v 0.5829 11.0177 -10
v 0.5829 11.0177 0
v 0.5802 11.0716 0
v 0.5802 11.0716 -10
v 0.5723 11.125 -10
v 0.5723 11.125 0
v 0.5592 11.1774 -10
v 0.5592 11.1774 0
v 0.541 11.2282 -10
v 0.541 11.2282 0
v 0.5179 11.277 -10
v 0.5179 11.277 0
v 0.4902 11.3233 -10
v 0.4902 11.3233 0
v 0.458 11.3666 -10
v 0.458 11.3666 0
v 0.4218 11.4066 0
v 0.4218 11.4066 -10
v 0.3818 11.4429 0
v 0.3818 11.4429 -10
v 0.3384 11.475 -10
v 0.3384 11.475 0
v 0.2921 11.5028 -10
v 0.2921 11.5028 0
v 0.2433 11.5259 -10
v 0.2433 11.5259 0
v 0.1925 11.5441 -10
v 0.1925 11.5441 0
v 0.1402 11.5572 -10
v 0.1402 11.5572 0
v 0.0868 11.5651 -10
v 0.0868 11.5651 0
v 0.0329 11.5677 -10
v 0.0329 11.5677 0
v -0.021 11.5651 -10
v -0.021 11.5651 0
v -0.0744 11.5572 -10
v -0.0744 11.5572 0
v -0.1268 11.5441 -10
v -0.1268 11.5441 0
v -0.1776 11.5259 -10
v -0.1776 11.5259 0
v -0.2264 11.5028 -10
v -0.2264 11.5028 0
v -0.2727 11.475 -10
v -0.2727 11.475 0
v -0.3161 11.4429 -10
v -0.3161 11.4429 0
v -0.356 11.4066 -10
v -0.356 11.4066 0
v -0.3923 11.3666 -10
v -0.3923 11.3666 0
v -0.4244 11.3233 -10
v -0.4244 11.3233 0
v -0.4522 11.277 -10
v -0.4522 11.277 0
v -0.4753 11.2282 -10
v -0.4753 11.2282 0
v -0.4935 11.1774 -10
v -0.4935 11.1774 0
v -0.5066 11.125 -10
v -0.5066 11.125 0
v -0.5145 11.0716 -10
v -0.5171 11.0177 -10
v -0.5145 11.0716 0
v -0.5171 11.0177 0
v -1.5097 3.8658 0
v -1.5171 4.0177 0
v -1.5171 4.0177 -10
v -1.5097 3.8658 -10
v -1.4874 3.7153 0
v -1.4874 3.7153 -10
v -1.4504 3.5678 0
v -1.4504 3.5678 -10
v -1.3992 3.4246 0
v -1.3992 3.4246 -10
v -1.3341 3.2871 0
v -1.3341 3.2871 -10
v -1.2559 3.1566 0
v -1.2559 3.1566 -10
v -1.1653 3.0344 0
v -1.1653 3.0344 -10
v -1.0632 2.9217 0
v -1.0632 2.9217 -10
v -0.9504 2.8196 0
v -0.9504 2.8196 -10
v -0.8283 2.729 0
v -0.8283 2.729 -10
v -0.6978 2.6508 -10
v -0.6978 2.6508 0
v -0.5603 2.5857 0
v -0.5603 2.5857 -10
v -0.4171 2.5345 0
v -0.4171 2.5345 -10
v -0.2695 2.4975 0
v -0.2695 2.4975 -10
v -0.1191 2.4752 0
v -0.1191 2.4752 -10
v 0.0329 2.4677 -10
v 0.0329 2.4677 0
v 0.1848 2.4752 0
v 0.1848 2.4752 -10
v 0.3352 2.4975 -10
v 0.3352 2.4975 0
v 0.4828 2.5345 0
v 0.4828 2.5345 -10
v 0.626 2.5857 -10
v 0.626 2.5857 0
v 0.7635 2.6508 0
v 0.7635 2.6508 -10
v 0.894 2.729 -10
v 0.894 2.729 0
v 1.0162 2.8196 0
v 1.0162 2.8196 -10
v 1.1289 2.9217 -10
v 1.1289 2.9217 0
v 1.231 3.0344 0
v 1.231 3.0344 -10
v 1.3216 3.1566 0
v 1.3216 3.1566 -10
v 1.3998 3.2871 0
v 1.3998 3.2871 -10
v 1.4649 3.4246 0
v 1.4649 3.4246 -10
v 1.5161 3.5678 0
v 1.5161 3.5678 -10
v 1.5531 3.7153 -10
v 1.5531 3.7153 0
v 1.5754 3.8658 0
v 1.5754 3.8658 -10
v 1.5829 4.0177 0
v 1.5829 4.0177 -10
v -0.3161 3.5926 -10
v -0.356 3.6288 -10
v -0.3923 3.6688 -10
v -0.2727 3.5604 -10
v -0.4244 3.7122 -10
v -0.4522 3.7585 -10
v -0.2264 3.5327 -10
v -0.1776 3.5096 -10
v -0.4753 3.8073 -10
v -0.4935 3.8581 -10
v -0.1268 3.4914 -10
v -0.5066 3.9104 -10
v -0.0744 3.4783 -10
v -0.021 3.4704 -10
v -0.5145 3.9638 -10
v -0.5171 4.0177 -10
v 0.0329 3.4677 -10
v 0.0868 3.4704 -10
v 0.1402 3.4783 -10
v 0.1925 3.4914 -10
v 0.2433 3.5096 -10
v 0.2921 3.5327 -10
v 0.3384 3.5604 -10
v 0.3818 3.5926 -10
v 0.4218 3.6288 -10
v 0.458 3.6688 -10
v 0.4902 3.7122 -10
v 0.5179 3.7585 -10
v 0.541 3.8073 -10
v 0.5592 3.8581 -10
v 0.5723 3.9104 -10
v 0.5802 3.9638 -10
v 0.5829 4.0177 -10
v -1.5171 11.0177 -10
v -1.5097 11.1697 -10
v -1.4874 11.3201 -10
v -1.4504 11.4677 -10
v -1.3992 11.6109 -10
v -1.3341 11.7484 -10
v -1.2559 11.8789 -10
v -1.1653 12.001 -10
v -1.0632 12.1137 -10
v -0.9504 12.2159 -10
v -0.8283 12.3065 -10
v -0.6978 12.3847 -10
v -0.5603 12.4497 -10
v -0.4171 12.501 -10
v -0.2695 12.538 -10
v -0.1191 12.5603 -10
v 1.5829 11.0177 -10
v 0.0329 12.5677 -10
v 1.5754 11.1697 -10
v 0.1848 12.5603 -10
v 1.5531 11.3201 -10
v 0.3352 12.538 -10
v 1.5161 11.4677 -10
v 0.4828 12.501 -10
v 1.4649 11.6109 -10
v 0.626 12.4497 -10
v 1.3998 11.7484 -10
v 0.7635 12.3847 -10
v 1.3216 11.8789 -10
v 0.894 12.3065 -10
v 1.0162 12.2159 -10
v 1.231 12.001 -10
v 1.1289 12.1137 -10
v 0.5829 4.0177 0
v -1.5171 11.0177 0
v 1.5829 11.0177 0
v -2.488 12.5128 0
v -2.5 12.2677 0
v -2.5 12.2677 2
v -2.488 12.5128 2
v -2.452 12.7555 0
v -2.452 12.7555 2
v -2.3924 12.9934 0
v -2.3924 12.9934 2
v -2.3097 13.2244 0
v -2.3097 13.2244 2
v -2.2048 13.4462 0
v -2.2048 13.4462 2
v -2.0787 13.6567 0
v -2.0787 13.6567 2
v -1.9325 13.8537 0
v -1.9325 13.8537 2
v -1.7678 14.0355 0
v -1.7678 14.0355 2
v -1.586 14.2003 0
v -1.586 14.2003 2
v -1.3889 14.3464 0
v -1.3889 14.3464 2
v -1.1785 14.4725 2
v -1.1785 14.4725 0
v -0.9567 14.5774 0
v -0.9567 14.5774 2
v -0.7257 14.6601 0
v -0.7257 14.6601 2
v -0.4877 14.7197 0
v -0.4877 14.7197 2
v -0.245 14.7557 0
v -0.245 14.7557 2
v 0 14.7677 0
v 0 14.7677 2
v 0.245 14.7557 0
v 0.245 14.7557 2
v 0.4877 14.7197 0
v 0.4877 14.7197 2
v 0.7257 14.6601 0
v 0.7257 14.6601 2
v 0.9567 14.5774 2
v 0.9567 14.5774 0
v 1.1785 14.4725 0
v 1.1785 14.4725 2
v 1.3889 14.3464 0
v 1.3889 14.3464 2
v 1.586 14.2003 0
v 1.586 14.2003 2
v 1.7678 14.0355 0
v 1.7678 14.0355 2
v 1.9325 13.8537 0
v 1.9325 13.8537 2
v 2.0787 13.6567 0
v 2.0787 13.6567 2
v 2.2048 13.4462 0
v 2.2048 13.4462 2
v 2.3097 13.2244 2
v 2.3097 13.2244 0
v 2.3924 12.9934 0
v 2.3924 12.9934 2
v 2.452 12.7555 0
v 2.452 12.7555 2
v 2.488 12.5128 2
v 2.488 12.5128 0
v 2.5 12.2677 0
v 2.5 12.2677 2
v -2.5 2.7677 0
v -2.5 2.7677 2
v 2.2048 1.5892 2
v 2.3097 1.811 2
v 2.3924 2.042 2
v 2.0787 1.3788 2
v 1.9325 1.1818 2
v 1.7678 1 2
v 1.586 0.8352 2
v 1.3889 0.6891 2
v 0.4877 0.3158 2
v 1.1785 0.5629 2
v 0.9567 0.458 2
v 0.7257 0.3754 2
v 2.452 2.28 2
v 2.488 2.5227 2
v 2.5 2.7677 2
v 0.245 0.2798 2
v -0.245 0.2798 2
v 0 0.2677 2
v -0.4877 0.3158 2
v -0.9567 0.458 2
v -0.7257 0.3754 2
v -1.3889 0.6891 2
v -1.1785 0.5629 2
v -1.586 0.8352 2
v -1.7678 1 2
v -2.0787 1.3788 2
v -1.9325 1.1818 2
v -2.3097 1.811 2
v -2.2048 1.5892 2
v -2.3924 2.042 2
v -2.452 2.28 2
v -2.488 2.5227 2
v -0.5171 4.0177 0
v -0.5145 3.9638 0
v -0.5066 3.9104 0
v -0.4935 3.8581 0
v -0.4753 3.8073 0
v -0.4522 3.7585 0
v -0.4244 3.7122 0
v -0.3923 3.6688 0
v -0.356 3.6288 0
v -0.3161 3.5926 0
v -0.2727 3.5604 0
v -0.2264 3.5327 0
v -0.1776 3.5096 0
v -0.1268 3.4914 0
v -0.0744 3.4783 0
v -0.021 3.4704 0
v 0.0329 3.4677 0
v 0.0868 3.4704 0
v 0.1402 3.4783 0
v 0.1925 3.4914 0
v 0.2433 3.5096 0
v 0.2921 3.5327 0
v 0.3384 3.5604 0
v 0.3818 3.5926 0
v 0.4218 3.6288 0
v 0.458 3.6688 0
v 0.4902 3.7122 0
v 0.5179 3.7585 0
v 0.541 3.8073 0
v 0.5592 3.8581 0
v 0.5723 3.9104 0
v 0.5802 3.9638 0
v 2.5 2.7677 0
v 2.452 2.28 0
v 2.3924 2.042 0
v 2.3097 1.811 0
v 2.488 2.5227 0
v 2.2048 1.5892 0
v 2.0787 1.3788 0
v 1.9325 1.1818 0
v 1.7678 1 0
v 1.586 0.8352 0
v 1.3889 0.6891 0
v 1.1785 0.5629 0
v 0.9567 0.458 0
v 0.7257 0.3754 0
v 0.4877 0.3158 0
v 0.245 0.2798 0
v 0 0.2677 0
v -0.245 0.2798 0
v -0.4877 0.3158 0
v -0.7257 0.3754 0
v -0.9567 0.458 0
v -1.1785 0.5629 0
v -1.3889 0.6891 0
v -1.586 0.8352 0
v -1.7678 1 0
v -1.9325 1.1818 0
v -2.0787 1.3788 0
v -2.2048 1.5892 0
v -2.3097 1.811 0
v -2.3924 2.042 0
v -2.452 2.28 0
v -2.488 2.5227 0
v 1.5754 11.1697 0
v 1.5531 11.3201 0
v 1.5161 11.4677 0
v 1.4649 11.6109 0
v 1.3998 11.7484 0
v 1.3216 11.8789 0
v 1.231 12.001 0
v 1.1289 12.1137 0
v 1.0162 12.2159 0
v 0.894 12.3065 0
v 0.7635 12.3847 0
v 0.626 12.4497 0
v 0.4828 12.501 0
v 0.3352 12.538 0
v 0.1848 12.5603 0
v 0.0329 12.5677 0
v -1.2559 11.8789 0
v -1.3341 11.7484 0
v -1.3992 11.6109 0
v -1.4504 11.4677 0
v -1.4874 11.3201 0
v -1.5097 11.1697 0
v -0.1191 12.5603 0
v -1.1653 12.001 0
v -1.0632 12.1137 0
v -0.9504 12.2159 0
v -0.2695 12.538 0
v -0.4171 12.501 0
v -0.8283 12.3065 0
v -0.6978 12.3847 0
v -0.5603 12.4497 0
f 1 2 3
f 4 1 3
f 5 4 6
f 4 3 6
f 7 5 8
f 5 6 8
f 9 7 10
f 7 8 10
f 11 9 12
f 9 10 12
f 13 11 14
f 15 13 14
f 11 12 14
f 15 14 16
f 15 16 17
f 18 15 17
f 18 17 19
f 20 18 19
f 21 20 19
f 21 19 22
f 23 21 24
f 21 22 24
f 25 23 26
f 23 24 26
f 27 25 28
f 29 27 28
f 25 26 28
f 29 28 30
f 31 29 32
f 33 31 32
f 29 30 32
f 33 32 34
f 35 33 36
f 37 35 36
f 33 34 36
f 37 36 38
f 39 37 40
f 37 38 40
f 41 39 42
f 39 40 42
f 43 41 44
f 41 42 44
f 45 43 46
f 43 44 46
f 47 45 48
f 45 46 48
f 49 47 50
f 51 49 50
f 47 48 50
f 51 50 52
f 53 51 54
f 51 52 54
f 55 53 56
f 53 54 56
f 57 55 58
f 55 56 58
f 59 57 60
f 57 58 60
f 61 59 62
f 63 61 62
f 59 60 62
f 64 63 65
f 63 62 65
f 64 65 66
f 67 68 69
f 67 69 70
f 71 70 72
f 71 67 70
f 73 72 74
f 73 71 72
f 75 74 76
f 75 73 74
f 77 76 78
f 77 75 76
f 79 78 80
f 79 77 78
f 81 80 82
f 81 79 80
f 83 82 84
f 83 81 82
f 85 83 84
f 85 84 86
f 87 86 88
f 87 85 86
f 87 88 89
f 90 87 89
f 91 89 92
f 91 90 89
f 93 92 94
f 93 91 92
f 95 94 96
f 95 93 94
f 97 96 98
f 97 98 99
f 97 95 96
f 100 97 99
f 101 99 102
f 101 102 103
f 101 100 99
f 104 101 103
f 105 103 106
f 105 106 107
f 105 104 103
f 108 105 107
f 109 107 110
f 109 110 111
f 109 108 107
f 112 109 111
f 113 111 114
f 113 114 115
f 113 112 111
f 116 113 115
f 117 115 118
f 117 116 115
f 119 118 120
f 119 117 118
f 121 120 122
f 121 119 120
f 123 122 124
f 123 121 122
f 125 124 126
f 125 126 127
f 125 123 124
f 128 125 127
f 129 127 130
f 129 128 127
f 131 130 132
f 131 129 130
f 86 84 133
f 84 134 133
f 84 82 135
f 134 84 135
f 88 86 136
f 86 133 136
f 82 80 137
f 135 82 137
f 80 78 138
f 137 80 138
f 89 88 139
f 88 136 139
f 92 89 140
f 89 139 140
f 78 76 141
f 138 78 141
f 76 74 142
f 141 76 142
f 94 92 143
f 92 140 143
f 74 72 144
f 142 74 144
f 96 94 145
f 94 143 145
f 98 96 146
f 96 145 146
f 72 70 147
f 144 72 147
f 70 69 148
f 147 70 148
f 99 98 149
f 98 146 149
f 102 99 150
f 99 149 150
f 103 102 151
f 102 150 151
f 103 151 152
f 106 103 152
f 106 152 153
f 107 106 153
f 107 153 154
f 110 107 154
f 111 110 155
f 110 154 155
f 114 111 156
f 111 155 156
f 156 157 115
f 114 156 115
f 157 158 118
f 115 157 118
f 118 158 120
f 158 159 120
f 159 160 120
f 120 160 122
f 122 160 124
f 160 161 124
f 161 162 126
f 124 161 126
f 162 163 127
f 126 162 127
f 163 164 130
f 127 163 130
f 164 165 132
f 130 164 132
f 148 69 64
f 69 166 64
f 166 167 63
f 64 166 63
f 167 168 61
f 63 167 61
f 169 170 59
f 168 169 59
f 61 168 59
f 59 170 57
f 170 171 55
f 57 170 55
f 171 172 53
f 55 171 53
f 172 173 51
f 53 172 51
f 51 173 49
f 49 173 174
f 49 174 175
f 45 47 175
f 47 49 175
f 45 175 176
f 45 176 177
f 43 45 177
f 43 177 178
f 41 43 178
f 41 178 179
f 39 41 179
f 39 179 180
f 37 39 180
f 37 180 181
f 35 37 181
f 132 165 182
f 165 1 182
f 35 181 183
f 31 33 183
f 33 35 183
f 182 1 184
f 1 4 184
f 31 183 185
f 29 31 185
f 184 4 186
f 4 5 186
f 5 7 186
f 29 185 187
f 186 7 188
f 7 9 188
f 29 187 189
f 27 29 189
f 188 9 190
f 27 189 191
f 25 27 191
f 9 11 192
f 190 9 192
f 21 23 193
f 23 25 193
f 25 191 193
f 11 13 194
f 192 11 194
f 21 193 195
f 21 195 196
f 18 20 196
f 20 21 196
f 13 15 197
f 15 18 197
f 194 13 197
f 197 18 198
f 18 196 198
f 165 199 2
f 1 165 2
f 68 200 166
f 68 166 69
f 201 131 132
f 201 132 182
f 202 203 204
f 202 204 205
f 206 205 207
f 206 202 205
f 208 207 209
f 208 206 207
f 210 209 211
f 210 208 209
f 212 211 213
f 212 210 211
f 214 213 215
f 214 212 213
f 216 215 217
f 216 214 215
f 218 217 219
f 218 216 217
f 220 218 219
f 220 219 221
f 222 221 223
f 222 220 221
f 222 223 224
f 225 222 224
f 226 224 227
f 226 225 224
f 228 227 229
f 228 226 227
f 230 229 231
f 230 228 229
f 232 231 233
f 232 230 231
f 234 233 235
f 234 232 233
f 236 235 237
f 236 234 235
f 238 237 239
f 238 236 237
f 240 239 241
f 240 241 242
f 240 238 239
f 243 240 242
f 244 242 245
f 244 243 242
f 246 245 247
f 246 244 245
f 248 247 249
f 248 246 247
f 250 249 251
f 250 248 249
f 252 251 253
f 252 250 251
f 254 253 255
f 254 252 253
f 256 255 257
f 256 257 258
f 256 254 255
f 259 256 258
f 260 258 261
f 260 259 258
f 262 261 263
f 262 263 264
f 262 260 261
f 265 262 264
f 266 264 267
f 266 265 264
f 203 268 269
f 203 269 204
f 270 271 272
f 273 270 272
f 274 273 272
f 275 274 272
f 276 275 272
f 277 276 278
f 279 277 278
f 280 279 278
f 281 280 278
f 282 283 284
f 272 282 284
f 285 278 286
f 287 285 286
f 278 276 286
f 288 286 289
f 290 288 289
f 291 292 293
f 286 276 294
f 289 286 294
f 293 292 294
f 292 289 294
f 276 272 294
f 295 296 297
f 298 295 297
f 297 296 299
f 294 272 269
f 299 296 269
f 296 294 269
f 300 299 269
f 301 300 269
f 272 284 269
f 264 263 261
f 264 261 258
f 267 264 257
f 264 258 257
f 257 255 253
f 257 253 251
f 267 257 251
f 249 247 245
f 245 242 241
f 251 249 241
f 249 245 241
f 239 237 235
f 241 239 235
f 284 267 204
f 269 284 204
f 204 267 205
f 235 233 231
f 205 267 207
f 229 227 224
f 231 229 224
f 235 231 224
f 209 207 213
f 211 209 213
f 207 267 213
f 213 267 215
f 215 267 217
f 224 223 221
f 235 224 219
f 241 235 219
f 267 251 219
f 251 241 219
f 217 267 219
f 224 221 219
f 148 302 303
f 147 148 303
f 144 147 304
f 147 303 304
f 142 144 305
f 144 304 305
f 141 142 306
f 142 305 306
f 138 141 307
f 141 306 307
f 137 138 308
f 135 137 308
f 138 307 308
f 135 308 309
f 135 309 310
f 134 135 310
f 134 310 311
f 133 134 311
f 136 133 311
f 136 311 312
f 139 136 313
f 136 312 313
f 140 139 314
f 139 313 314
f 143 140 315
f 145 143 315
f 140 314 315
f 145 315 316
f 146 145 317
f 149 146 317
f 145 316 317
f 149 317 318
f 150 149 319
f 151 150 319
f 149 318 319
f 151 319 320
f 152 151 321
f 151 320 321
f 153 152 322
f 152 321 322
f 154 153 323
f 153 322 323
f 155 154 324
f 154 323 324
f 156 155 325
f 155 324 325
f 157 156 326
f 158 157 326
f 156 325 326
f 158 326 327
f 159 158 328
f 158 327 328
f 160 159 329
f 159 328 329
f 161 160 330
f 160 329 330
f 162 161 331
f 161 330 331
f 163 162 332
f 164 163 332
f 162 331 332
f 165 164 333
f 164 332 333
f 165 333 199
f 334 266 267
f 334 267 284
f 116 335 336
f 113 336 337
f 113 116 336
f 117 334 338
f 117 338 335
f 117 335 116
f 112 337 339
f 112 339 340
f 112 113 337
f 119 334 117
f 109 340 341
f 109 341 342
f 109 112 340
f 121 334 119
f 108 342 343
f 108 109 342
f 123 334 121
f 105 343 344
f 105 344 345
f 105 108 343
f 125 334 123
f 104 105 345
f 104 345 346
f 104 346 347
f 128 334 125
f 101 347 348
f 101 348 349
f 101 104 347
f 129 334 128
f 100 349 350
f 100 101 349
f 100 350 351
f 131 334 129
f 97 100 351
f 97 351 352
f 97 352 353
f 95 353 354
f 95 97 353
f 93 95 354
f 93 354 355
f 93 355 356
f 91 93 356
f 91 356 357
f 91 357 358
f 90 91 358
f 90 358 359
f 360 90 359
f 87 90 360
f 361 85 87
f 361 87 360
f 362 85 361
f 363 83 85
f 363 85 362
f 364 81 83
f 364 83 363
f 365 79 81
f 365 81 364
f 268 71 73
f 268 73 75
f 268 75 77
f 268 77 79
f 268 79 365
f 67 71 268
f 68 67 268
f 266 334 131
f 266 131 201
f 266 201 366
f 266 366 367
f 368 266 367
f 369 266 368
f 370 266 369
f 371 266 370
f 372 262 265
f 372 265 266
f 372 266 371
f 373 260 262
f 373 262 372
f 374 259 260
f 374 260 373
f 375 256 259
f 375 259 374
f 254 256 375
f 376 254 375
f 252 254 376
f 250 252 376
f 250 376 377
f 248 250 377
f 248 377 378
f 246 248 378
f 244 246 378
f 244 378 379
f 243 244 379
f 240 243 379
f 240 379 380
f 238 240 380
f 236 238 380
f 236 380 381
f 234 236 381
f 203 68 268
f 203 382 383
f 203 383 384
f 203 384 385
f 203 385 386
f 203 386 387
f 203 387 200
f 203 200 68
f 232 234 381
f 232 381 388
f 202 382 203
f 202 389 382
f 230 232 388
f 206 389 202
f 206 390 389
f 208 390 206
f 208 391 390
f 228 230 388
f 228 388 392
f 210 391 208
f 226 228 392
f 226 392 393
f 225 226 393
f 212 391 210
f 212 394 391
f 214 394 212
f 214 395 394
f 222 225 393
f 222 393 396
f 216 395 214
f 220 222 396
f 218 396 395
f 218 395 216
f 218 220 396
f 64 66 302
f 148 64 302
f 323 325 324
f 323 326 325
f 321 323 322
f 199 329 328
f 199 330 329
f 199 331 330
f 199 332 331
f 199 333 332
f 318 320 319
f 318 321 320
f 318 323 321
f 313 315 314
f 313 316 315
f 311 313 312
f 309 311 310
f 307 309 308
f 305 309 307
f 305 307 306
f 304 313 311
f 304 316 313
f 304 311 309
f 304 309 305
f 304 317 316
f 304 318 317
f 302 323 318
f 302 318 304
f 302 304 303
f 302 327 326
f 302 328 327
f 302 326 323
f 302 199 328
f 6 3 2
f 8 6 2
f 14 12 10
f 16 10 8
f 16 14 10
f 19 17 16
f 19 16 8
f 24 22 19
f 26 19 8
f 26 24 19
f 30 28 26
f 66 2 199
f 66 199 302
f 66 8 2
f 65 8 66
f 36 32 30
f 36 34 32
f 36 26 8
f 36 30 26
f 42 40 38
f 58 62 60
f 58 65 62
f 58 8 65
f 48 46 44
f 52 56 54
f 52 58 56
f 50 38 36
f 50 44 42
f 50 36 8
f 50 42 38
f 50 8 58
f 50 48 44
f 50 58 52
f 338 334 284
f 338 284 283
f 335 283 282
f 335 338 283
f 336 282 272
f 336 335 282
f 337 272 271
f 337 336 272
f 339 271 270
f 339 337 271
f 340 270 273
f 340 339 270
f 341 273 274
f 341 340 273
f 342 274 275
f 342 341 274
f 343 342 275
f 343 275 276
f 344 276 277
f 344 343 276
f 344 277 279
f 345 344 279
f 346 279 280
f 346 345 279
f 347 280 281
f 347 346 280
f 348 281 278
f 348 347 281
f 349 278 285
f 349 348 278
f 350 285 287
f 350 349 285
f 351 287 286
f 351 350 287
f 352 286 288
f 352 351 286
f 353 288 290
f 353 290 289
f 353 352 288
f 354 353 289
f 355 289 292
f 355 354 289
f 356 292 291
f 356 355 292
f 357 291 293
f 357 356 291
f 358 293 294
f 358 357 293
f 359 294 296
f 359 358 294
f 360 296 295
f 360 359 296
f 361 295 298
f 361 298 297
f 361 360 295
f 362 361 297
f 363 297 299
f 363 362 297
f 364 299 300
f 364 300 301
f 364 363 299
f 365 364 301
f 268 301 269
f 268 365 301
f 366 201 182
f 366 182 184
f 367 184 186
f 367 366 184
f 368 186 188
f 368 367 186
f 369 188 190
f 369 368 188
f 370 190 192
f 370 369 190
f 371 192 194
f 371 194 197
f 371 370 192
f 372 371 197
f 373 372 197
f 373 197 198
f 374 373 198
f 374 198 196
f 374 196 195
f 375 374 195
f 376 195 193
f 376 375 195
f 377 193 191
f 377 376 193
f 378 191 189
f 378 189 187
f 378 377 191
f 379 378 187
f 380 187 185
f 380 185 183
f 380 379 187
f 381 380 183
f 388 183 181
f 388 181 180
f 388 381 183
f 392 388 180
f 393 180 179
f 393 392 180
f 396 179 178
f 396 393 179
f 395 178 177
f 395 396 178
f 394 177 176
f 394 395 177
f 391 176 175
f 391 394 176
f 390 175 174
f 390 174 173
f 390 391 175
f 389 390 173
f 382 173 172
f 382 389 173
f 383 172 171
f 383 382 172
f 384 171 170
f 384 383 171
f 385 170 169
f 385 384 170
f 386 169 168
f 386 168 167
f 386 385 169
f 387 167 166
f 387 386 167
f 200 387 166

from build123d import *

# Parameters (mm, degrees)
BOSS_EXTRU_3_DEPTH = 10
BOSS_EXTRU_4_DEPTH = 2


with BuildPart() as part:
    # Esquisse1 → Boss.-Extru.3 (new body)
    with BuildSketch(Plane.XY):
        with BuildLine():
            Line((-1.517140129, 11.017733261), (-1.517140129, 4.017733261))
            ThreePointArc((-1.517140129, 4.017733261), (0.032859871, 2.467733261), (1.582859871, 4.017733261))
            Line((1.582859871, 4.017733261), (1.582859871, 11.017733261))
            ThreePointArc((1.582859871, 11.017733261), (0.032859871, 12.567733261), (-1.517140129, 11.017733261))
        make_face()
        with BuildLine():
            Line((-0.517140129, 11.017733261), (-0.517140129, 4.017733261))
            ThreePointArc((-0.517140129, 4.017733261), (0.032859871, 3.467733261), (0.582859871, 4.017733261))
            Line((0.582859871, 4.017733261), (0.582859871, 11.017733261))
            ThreePointArc((0.582859871, 11.017733261), (0.032859871, 11.567733261), (-0.517140129, 11.017733261))
        make_face(mode=Mode.SUBTRACT)
    extrude(amount=-BOSS_EXTRU_3_DEPTH)

    # Esquisse3 → Boss.-Extru.4 (add)
    with BuildSketch(Plane.XY):
        with BuildLine():
            Line((-2.5, 2.767733261), (-2.5, 12.267733261))
            ThreePointArc((-2.5, 12.267733261), (0, 14.767733261), (2.5, 12.267733261))
            Line((2.5, 12.267733261), (2.5, 2.767733261))
            ThreePointArc((2.5, 2.767733261), (0, 0.267733261), (-2.5, 2.767733261))
        make_face()
    extrude(amount=BOSS_EXTRU_4_DEPTH)


solid = part.part
